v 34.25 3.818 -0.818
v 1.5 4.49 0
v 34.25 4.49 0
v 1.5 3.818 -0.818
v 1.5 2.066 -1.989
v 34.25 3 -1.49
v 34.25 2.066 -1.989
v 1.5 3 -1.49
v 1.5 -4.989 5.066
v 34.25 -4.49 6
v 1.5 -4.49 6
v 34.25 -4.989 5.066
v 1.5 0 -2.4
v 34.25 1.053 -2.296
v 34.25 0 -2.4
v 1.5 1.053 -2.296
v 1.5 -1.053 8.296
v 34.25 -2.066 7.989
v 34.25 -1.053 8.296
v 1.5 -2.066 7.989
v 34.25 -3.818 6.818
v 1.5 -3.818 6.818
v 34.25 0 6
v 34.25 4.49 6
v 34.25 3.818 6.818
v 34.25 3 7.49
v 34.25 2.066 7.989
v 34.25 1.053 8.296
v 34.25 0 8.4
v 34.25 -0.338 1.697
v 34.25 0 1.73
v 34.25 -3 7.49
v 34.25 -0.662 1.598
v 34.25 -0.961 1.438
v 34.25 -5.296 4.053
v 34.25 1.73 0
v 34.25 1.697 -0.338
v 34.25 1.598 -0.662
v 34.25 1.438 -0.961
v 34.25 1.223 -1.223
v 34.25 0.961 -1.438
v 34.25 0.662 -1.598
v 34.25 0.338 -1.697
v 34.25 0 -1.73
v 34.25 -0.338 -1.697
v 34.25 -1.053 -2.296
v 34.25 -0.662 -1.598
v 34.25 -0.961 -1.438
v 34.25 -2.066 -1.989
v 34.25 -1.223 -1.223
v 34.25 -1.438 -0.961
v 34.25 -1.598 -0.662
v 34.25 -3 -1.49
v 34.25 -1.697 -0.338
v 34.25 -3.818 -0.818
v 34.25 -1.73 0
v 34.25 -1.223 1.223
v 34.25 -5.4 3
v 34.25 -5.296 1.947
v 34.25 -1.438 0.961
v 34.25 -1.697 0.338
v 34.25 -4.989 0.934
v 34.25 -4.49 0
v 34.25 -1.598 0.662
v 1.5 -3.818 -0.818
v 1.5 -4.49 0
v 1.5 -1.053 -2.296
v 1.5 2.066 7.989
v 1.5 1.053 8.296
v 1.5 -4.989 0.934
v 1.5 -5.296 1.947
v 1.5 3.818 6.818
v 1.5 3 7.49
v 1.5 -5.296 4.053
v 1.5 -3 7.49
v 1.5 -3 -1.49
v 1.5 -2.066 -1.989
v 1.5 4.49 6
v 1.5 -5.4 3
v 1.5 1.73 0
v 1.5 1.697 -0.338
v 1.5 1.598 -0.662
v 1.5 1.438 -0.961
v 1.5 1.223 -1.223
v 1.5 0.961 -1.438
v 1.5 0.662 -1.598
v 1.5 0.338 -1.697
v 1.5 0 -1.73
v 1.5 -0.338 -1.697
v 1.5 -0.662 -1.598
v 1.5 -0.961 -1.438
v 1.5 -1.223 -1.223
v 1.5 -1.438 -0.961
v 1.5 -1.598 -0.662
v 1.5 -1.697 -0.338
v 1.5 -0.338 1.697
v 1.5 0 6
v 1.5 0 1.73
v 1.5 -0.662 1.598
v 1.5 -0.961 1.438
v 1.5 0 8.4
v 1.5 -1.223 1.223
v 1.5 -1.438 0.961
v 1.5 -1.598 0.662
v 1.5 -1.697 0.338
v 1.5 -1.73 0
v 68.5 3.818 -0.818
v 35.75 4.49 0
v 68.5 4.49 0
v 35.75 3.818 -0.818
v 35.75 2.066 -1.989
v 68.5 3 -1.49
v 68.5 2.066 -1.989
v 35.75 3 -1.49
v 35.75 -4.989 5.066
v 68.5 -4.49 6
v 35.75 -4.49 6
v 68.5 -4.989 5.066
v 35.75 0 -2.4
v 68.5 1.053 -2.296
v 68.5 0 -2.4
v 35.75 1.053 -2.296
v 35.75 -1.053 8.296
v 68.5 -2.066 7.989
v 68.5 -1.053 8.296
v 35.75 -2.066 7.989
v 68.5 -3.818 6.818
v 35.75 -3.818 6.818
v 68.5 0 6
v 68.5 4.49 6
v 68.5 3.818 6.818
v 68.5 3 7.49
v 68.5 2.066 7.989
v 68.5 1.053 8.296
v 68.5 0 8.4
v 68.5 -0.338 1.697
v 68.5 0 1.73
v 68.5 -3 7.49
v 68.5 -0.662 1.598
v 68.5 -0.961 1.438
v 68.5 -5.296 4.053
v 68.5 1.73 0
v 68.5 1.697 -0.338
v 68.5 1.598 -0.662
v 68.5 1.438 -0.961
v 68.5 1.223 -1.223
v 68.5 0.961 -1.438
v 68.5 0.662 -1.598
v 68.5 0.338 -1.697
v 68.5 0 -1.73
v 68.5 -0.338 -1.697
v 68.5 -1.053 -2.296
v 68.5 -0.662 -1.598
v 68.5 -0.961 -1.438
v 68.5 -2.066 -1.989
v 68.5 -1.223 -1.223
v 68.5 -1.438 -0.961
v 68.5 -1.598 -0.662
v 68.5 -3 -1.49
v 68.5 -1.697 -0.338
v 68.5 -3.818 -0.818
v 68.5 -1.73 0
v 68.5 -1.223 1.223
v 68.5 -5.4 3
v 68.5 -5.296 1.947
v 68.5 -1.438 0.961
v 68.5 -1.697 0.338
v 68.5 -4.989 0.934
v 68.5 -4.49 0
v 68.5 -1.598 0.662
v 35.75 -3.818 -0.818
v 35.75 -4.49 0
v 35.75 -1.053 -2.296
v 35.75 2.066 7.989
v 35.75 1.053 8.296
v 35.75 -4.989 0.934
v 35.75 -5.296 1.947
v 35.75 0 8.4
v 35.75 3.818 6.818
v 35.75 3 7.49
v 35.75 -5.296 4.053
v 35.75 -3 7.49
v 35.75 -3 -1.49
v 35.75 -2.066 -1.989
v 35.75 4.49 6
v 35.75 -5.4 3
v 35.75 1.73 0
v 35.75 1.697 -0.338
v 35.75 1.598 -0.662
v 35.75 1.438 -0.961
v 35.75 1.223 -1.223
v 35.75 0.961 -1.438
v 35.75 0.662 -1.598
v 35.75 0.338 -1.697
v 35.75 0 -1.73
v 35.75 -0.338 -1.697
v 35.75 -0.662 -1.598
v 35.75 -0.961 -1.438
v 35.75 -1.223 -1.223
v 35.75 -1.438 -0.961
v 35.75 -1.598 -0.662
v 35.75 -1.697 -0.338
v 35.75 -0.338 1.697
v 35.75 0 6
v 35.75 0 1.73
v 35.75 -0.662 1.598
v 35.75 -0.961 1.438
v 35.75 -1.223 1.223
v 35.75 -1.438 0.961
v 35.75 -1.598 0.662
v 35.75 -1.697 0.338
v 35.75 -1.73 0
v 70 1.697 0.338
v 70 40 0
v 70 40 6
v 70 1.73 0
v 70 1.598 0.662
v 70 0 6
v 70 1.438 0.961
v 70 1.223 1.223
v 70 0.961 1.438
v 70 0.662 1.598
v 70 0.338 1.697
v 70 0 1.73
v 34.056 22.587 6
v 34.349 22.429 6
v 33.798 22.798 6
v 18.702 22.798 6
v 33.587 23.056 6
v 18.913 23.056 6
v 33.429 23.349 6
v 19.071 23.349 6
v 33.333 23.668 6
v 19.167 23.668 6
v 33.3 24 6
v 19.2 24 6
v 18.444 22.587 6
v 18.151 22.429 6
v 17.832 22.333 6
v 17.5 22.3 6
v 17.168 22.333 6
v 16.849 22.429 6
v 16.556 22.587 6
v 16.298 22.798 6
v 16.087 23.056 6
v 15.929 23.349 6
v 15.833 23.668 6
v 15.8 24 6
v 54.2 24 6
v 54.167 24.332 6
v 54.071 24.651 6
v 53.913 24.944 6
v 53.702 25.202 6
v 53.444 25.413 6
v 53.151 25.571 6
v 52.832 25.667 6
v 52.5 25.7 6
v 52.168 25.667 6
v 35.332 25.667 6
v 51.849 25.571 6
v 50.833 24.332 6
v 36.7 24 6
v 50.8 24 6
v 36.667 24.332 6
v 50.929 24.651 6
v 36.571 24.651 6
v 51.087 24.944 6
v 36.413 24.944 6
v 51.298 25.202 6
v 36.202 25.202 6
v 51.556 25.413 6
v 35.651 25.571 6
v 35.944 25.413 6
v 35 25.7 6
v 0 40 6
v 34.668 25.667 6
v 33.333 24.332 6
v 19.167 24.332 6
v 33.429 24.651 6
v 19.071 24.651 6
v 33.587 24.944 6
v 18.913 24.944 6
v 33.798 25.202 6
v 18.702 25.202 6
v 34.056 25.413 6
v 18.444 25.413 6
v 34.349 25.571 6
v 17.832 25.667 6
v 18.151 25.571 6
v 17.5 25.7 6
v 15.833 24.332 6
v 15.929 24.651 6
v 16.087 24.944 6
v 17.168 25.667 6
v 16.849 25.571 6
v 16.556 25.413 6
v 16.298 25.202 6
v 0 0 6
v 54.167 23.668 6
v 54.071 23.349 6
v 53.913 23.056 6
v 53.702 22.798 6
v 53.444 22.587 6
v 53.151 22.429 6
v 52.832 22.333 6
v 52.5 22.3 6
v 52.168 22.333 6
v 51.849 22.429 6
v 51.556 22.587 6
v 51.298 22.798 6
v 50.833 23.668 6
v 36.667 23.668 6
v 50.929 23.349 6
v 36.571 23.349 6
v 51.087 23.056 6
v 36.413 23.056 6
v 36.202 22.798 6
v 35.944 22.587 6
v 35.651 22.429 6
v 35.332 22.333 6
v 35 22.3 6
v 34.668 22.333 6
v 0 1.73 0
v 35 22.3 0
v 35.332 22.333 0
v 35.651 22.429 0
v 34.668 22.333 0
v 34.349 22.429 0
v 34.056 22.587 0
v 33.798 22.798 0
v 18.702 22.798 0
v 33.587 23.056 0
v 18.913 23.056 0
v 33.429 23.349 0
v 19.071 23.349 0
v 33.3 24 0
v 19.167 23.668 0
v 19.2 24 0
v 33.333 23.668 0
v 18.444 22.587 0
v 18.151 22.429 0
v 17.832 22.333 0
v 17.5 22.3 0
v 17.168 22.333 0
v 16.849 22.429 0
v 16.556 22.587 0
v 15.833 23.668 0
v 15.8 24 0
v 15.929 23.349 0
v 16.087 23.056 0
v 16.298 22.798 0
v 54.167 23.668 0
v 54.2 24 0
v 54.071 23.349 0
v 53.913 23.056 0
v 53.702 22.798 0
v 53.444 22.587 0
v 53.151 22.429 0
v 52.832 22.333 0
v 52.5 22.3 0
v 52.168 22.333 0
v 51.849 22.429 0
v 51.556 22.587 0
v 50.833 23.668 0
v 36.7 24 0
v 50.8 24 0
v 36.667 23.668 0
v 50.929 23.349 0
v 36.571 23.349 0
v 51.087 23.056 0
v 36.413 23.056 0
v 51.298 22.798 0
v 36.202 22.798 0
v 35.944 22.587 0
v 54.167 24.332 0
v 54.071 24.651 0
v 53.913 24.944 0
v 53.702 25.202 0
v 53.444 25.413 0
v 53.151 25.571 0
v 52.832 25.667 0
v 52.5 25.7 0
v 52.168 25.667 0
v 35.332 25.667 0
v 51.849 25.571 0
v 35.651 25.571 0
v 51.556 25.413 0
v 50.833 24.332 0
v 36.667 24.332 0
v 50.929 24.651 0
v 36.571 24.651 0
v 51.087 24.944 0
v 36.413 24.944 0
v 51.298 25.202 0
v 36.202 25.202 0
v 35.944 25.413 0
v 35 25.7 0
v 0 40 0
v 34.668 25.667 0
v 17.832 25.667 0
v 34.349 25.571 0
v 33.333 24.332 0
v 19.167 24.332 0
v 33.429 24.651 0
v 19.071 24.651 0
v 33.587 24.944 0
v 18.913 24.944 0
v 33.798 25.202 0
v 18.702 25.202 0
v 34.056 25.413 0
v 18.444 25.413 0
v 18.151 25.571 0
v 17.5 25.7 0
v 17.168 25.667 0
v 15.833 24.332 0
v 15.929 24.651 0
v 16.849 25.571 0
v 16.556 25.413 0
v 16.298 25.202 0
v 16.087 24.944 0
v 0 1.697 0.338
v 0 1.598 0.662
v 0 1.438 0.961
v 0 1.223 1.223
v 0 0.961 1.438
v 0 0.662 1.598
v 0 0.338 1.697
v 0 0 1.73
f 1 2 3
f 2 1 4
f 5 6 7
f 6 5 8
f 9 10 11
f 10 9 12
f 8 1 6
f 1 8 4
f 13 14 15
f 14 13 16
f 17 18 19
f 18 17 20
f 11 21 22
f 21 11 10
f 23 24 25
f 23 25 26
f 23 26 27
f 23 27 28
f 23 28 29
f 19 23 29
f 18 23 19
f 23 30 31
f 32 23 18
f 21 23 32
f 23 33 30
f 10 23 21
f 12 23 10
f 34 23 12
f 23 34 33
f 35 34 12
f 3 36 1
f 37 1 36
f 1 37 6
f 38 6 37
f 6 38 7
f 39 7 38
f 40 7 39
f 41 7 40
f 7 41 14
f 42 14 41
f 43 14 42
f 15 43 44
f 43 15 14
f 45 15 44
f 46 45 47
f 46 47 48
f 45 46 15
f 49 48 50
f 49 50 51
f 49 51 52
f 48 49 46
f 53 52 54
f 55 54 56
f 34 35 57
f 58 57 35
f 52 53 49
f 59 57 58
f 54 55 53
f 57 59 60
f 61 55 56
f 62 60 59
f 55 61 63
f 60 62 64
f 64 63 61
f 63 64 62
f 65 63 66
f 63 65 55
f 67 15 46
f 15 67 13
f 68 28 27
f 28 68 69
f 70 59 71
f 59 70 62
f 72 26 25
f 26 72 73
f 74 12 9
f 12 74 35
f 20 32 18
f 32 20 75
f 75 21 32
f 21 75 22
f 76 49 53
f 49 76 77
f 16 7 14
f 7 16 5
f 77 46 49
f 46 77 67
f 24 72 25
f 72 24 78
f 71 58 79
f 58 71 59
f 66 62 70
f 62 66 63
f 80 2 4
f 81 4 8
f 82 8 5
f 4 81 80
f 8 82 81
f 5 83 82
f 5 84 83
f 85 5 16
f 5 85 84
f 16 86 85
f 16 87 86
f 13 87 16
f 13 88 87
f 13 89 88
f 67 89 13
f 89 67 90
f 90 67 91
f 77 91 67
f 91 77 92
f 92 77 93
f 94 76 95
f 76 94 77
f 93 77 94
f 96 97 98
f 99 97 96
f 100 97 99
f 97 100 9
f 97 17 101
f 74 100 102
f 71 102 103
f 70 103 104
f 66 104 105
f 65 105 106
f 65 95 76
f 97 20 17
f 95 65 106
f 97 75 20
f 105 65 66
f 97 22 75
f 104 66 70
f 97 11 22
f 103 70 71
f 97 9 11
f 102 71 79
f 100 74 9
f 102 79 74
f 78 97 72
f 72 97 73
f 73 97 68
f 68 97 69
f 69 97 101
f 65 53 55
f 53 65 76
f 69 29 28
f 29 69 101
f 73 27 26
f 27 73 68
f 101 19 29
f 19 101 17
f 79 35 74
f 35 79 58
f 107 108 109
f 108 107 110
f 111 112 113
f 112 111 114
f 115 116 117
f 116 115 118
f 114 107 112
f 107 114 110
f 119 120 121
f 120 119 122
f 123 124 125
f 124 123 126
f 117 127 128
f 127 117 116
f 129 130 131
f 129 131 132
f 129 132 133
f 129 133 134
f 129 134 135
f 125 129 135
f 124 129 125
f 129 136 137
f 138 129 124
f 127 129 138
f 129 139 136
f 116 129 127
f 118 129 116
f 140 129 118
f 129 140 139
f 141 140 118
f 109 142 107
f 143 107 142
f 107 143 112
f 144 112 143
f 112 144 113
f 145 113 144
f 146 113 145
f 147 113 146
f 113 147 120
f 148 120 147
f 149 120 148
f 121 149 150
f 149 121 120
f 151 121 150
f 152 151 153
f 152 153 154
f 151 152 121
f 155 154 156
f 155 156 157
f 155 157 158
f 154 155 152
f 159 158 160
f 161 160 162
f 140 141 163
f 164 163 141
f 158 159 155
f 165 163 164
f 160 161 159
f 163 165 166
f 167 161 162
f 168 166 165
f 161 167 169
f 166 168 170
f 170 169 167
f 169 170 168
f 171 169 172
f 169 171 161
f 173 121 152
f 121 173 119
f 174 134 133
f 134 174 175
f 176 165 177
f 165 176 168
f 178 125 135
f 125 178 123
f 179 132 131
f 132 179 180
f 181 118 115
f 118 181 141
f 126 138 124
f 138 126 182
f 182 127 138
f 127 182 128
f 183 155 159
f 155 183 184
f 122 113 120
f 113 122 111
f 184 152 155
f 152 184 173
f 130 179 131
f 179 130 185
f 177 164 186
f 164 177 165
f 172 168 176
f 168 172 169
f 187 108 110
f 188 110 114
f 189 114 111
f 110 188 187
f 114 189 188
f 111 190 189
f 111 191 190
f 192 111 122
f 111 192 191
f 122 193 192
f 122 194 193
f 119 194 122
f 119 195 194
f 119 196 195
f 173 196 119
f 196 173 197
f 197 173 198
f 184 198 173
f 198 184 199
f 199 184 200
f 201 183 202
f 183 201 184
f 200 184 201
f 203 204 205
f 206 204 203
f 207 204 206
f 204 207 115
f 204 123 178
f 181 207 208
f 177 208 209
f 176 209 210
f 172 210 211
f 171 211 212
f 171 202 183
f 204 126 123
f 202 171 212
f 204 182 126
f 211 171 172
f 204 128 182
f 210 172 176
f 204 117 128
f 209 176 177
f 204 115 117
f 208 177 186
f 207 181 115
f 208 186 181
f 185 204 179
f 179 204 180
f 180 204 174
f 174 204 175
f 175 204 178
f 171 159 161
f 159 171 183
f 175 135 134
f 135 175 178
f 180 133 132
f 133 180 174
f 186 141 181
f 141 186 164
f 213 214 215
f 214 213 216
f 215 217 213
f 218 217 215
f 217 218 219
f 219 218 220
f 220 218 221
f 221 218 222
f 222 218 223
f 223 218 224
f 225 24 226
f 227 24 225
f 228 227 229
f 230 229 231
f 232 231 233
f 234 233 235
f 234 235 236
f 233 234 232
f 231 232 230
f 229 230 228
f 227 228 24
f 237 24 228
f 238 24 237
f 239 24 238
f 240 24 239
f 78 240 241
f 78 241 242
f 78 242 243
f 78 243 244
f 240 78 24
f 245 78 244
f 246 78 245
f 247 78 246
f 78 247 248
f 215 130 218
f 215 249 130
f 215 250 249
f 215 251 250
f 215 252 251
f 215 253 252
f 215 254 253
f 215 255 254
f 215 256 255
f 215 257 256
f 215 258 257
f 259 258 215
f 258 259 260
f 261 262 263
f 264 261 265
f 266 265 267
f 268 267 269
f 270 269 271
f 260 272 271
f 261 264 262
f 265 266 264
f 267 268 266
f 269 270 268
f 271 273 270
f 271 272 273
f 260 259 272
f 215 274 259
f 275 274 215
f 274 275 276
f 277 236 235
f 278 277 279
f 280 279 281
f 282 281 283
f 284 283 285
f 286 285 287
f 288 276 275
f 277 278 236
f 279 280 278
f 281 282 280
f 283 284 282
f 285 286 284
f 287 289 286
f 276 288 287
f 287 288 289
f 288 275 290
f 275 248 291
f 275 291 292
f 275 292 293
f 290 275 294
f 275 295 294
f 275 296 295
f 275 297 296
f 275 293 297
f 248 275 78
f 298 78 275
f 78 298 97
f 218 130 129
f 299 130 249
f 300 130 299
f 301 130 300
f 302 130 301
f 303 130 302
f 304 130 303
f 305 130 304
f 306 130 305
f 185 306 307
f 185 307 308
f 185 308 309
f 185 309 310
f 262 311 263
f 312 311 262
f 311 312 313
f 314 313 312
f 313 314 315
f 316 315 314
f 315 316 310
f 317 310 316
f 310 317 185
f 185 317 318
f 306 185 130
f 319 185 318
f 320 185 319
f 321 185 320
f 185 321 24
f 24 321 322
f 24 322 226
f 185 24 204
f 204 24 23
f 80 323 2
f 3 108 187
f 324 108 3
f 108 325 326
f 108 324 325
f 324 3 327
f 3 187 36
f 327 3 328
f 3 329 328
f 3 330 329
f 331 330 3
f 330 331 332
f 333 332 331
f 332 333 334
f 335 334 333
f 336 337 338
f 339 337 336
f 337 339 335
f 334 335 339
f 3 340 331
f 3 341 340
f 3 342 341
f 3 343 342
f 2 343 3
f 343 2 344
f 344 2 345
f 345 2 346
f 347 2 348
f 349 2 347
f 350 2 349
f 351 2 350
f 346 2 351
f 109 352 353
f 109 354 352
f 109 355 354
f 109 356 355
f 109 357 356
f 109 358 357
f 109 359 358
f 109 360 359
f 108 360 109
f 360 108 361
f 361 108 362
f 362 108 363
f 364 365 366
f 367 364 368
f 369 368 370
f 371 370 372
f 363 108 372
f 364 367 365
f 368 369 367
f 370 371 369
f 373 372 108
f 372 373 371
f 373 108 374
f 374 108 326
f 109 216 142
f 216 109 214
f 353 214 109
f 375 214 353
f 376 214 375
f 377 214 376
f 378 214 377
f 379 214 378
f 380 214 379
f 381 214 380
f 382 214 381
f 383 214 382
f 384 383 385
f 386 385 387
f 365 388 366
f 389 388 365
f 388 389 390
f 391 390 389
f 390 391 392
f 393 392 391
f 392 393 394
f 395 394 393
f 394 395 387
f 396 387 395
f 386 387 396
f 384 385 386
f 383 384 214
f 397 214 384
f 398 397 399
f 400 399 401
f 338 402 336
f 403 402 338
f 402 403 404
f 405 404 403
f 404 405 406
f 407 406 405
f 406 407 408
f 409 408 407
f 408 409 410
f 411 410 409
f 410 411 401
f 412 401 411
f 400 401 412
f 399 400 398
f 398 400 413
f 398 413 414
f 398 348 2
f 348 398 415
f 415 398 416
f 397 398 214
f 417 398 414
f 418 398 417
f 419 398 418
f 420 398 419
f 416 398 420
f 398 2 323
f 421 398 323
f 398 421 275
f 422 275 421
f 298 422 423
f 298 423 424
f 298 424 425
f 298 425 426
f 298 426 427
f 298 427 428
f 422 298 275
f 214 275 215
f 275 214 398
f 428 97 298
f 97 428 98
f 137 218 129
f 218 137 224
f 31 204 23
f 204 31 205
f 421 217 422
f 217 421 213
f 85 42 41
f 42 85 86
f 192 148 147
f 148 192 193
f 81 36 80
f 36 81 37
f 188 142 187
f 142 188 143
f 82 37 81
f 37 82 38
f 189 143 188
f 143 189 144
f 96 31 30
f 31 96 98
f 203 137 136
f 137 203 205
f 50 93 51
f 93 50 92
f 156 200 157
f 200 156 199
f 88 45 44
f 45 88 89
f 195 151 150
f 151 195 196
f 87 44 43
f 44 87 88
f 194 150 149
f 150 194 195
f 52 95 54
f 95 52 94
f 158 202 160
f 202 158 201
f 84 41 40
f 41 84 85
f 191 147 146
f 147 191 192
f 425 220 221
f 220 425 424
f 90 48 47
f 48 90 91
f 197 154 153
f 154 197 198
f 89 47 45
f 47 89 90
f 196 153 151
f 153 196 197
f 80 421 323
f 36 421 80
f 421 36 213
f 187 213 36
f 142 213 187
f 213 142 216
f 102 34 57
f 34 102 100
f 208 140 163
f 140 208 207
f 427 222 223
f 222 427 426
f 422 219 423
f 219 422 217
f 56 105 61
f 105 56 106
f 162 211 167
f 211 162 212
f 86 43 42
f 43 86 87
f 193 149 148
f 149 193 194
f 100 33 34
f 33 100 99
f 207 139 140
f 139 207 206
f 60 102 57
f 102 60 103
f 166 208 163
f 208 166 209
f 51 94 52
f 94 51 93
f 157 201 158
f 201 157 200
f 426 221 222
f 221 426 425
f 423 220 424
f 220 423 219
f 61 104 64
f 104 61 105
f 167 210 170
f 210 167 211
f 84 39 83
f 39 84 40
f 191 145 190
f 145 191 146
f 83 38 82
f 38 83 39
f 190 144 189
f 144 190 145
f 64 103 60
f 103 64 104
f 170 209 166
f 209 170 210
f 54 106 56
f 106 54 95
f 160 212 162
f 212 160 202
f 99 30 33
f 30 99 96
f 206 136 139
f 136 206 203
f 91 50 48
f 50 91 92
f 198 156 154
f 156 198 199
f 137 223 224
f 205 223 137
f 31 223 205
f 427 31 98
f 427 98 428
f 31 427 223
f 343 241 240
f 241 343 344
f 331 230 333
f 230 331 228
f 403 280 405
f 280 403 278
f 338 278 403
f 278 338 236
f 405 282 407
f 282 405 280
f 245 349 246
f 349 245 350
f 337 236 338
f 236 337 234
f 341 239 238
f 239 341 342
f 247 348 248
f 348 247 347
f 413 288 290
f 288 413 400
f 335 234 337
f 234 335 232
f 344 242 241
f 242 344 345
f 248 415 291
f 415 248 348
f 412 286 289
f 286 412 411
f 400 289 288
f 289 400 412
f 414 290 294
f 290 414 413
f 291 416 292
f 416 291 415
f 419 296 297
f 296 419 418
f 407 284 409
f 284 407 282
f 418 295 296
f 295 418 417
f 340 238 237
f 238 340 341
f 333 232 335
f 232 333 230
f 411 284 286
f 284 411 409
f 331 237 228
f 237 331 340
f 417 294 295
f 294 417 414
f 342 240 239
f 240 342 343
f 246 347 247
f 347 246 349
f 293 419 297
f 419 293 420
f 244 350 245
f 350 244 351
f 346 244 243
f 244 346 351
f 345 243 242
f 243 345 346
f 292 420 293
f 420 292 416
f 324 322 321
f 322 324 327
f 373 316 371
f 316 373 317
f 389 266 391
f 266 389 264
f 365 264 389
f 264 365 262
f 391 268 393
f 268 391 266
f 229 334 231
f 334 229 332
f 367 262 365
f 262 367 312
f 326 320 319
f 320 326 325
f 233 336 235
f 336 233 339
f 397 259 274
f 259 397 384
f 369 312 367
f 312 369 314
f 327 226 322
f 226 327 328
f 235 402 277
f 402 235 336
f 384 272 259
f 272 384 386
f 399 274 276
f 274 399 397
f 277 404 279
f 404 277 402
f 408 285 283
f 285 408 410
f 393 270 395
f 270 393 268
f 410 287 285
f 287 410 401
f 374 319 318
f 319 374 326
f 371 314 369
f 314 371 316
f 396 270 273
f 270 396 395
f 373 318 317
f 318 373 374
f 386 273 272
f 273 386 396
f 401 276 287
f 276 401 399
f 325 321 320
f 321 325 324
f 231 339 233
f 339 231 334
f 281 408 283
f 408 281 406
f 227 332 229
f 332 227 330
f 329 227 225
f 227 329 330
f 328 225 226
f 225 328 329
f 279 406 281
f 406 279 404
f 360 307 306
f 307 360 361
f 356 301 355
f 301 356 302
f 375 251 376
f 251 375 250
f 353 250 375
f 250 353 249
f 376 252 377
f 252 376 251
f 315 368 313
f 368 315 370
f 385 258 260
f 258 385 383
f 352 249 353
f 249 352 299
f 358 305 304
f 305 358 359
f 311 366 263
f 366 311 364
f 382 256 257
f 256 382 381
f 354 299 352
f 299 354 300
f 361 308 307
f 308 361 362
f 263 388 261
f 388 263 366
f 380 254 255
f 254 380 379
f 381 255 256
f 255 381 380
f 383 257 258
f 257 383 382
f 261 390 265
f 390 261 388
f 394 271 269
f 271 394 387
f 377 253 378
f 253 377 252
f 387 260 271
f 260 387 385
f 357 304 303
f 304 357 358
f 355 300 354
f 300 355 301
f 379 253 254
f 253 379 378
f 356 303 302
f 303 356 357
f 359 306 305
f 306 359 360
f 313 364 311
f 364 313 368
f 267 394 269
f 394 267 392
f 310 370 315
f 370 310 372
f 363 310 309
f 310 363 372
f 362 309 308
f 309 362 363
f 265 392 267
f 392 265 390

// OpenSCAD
$fn = 32;

// ----------------------------------------------------------------------
// Hinge leaf: 70 x 45.4 x 10.8 mm
// ----------------------------------------------------------------------

// --- parameters (mm) ---
plate_len = 70;           // leaf length, X
plate_w = 40;             // leaf width, Y
plate_t = 6;              // leaf thickness
barrel_d = 10.8;          // knuckle diameter
barrel_w = 32.75;         // knuckle width
knuckle_n = 2;            // number of knuckles
pin_d = 3.46;             // pin bore
gap = 1.5;                // gap between the knuckles
screw_d = 3.4;            // screw clearance

module leaf() {
  cube([plate_len, plate_w, plate_t]);
}

module knuckles() {
  /* barrels sit on the leaf edge, the pin axis at half the leaf thickness */
  for (i = [0 : knuckle_n - 1])
    translate([gap + i * (barrel_w + gap), 0, plate_t * 0.5])
      rotate([0, 90, 0]) cylinder(h = barrel_w, d = barrel_d);
}

difference() {
  union() {
    leaf();
    knuckles();
  }
  rotate([0, 90, 0]) translate([0, 0, -1])
    cylinder(h = plate_len + 2, d = pin_d);
  translate([17.5, plate_w * 0.6, -1]) cylinder(h = plate_t + 2, d = screw_d);
  translate([35, plate_w * 0.6, -1]) cylinder(h = plate_t + 2, d = screw_d);
  translate([52.5, plate_w * 0.6, -1]) cylinder(h = plate_t + 2, d = screw_d);
}
